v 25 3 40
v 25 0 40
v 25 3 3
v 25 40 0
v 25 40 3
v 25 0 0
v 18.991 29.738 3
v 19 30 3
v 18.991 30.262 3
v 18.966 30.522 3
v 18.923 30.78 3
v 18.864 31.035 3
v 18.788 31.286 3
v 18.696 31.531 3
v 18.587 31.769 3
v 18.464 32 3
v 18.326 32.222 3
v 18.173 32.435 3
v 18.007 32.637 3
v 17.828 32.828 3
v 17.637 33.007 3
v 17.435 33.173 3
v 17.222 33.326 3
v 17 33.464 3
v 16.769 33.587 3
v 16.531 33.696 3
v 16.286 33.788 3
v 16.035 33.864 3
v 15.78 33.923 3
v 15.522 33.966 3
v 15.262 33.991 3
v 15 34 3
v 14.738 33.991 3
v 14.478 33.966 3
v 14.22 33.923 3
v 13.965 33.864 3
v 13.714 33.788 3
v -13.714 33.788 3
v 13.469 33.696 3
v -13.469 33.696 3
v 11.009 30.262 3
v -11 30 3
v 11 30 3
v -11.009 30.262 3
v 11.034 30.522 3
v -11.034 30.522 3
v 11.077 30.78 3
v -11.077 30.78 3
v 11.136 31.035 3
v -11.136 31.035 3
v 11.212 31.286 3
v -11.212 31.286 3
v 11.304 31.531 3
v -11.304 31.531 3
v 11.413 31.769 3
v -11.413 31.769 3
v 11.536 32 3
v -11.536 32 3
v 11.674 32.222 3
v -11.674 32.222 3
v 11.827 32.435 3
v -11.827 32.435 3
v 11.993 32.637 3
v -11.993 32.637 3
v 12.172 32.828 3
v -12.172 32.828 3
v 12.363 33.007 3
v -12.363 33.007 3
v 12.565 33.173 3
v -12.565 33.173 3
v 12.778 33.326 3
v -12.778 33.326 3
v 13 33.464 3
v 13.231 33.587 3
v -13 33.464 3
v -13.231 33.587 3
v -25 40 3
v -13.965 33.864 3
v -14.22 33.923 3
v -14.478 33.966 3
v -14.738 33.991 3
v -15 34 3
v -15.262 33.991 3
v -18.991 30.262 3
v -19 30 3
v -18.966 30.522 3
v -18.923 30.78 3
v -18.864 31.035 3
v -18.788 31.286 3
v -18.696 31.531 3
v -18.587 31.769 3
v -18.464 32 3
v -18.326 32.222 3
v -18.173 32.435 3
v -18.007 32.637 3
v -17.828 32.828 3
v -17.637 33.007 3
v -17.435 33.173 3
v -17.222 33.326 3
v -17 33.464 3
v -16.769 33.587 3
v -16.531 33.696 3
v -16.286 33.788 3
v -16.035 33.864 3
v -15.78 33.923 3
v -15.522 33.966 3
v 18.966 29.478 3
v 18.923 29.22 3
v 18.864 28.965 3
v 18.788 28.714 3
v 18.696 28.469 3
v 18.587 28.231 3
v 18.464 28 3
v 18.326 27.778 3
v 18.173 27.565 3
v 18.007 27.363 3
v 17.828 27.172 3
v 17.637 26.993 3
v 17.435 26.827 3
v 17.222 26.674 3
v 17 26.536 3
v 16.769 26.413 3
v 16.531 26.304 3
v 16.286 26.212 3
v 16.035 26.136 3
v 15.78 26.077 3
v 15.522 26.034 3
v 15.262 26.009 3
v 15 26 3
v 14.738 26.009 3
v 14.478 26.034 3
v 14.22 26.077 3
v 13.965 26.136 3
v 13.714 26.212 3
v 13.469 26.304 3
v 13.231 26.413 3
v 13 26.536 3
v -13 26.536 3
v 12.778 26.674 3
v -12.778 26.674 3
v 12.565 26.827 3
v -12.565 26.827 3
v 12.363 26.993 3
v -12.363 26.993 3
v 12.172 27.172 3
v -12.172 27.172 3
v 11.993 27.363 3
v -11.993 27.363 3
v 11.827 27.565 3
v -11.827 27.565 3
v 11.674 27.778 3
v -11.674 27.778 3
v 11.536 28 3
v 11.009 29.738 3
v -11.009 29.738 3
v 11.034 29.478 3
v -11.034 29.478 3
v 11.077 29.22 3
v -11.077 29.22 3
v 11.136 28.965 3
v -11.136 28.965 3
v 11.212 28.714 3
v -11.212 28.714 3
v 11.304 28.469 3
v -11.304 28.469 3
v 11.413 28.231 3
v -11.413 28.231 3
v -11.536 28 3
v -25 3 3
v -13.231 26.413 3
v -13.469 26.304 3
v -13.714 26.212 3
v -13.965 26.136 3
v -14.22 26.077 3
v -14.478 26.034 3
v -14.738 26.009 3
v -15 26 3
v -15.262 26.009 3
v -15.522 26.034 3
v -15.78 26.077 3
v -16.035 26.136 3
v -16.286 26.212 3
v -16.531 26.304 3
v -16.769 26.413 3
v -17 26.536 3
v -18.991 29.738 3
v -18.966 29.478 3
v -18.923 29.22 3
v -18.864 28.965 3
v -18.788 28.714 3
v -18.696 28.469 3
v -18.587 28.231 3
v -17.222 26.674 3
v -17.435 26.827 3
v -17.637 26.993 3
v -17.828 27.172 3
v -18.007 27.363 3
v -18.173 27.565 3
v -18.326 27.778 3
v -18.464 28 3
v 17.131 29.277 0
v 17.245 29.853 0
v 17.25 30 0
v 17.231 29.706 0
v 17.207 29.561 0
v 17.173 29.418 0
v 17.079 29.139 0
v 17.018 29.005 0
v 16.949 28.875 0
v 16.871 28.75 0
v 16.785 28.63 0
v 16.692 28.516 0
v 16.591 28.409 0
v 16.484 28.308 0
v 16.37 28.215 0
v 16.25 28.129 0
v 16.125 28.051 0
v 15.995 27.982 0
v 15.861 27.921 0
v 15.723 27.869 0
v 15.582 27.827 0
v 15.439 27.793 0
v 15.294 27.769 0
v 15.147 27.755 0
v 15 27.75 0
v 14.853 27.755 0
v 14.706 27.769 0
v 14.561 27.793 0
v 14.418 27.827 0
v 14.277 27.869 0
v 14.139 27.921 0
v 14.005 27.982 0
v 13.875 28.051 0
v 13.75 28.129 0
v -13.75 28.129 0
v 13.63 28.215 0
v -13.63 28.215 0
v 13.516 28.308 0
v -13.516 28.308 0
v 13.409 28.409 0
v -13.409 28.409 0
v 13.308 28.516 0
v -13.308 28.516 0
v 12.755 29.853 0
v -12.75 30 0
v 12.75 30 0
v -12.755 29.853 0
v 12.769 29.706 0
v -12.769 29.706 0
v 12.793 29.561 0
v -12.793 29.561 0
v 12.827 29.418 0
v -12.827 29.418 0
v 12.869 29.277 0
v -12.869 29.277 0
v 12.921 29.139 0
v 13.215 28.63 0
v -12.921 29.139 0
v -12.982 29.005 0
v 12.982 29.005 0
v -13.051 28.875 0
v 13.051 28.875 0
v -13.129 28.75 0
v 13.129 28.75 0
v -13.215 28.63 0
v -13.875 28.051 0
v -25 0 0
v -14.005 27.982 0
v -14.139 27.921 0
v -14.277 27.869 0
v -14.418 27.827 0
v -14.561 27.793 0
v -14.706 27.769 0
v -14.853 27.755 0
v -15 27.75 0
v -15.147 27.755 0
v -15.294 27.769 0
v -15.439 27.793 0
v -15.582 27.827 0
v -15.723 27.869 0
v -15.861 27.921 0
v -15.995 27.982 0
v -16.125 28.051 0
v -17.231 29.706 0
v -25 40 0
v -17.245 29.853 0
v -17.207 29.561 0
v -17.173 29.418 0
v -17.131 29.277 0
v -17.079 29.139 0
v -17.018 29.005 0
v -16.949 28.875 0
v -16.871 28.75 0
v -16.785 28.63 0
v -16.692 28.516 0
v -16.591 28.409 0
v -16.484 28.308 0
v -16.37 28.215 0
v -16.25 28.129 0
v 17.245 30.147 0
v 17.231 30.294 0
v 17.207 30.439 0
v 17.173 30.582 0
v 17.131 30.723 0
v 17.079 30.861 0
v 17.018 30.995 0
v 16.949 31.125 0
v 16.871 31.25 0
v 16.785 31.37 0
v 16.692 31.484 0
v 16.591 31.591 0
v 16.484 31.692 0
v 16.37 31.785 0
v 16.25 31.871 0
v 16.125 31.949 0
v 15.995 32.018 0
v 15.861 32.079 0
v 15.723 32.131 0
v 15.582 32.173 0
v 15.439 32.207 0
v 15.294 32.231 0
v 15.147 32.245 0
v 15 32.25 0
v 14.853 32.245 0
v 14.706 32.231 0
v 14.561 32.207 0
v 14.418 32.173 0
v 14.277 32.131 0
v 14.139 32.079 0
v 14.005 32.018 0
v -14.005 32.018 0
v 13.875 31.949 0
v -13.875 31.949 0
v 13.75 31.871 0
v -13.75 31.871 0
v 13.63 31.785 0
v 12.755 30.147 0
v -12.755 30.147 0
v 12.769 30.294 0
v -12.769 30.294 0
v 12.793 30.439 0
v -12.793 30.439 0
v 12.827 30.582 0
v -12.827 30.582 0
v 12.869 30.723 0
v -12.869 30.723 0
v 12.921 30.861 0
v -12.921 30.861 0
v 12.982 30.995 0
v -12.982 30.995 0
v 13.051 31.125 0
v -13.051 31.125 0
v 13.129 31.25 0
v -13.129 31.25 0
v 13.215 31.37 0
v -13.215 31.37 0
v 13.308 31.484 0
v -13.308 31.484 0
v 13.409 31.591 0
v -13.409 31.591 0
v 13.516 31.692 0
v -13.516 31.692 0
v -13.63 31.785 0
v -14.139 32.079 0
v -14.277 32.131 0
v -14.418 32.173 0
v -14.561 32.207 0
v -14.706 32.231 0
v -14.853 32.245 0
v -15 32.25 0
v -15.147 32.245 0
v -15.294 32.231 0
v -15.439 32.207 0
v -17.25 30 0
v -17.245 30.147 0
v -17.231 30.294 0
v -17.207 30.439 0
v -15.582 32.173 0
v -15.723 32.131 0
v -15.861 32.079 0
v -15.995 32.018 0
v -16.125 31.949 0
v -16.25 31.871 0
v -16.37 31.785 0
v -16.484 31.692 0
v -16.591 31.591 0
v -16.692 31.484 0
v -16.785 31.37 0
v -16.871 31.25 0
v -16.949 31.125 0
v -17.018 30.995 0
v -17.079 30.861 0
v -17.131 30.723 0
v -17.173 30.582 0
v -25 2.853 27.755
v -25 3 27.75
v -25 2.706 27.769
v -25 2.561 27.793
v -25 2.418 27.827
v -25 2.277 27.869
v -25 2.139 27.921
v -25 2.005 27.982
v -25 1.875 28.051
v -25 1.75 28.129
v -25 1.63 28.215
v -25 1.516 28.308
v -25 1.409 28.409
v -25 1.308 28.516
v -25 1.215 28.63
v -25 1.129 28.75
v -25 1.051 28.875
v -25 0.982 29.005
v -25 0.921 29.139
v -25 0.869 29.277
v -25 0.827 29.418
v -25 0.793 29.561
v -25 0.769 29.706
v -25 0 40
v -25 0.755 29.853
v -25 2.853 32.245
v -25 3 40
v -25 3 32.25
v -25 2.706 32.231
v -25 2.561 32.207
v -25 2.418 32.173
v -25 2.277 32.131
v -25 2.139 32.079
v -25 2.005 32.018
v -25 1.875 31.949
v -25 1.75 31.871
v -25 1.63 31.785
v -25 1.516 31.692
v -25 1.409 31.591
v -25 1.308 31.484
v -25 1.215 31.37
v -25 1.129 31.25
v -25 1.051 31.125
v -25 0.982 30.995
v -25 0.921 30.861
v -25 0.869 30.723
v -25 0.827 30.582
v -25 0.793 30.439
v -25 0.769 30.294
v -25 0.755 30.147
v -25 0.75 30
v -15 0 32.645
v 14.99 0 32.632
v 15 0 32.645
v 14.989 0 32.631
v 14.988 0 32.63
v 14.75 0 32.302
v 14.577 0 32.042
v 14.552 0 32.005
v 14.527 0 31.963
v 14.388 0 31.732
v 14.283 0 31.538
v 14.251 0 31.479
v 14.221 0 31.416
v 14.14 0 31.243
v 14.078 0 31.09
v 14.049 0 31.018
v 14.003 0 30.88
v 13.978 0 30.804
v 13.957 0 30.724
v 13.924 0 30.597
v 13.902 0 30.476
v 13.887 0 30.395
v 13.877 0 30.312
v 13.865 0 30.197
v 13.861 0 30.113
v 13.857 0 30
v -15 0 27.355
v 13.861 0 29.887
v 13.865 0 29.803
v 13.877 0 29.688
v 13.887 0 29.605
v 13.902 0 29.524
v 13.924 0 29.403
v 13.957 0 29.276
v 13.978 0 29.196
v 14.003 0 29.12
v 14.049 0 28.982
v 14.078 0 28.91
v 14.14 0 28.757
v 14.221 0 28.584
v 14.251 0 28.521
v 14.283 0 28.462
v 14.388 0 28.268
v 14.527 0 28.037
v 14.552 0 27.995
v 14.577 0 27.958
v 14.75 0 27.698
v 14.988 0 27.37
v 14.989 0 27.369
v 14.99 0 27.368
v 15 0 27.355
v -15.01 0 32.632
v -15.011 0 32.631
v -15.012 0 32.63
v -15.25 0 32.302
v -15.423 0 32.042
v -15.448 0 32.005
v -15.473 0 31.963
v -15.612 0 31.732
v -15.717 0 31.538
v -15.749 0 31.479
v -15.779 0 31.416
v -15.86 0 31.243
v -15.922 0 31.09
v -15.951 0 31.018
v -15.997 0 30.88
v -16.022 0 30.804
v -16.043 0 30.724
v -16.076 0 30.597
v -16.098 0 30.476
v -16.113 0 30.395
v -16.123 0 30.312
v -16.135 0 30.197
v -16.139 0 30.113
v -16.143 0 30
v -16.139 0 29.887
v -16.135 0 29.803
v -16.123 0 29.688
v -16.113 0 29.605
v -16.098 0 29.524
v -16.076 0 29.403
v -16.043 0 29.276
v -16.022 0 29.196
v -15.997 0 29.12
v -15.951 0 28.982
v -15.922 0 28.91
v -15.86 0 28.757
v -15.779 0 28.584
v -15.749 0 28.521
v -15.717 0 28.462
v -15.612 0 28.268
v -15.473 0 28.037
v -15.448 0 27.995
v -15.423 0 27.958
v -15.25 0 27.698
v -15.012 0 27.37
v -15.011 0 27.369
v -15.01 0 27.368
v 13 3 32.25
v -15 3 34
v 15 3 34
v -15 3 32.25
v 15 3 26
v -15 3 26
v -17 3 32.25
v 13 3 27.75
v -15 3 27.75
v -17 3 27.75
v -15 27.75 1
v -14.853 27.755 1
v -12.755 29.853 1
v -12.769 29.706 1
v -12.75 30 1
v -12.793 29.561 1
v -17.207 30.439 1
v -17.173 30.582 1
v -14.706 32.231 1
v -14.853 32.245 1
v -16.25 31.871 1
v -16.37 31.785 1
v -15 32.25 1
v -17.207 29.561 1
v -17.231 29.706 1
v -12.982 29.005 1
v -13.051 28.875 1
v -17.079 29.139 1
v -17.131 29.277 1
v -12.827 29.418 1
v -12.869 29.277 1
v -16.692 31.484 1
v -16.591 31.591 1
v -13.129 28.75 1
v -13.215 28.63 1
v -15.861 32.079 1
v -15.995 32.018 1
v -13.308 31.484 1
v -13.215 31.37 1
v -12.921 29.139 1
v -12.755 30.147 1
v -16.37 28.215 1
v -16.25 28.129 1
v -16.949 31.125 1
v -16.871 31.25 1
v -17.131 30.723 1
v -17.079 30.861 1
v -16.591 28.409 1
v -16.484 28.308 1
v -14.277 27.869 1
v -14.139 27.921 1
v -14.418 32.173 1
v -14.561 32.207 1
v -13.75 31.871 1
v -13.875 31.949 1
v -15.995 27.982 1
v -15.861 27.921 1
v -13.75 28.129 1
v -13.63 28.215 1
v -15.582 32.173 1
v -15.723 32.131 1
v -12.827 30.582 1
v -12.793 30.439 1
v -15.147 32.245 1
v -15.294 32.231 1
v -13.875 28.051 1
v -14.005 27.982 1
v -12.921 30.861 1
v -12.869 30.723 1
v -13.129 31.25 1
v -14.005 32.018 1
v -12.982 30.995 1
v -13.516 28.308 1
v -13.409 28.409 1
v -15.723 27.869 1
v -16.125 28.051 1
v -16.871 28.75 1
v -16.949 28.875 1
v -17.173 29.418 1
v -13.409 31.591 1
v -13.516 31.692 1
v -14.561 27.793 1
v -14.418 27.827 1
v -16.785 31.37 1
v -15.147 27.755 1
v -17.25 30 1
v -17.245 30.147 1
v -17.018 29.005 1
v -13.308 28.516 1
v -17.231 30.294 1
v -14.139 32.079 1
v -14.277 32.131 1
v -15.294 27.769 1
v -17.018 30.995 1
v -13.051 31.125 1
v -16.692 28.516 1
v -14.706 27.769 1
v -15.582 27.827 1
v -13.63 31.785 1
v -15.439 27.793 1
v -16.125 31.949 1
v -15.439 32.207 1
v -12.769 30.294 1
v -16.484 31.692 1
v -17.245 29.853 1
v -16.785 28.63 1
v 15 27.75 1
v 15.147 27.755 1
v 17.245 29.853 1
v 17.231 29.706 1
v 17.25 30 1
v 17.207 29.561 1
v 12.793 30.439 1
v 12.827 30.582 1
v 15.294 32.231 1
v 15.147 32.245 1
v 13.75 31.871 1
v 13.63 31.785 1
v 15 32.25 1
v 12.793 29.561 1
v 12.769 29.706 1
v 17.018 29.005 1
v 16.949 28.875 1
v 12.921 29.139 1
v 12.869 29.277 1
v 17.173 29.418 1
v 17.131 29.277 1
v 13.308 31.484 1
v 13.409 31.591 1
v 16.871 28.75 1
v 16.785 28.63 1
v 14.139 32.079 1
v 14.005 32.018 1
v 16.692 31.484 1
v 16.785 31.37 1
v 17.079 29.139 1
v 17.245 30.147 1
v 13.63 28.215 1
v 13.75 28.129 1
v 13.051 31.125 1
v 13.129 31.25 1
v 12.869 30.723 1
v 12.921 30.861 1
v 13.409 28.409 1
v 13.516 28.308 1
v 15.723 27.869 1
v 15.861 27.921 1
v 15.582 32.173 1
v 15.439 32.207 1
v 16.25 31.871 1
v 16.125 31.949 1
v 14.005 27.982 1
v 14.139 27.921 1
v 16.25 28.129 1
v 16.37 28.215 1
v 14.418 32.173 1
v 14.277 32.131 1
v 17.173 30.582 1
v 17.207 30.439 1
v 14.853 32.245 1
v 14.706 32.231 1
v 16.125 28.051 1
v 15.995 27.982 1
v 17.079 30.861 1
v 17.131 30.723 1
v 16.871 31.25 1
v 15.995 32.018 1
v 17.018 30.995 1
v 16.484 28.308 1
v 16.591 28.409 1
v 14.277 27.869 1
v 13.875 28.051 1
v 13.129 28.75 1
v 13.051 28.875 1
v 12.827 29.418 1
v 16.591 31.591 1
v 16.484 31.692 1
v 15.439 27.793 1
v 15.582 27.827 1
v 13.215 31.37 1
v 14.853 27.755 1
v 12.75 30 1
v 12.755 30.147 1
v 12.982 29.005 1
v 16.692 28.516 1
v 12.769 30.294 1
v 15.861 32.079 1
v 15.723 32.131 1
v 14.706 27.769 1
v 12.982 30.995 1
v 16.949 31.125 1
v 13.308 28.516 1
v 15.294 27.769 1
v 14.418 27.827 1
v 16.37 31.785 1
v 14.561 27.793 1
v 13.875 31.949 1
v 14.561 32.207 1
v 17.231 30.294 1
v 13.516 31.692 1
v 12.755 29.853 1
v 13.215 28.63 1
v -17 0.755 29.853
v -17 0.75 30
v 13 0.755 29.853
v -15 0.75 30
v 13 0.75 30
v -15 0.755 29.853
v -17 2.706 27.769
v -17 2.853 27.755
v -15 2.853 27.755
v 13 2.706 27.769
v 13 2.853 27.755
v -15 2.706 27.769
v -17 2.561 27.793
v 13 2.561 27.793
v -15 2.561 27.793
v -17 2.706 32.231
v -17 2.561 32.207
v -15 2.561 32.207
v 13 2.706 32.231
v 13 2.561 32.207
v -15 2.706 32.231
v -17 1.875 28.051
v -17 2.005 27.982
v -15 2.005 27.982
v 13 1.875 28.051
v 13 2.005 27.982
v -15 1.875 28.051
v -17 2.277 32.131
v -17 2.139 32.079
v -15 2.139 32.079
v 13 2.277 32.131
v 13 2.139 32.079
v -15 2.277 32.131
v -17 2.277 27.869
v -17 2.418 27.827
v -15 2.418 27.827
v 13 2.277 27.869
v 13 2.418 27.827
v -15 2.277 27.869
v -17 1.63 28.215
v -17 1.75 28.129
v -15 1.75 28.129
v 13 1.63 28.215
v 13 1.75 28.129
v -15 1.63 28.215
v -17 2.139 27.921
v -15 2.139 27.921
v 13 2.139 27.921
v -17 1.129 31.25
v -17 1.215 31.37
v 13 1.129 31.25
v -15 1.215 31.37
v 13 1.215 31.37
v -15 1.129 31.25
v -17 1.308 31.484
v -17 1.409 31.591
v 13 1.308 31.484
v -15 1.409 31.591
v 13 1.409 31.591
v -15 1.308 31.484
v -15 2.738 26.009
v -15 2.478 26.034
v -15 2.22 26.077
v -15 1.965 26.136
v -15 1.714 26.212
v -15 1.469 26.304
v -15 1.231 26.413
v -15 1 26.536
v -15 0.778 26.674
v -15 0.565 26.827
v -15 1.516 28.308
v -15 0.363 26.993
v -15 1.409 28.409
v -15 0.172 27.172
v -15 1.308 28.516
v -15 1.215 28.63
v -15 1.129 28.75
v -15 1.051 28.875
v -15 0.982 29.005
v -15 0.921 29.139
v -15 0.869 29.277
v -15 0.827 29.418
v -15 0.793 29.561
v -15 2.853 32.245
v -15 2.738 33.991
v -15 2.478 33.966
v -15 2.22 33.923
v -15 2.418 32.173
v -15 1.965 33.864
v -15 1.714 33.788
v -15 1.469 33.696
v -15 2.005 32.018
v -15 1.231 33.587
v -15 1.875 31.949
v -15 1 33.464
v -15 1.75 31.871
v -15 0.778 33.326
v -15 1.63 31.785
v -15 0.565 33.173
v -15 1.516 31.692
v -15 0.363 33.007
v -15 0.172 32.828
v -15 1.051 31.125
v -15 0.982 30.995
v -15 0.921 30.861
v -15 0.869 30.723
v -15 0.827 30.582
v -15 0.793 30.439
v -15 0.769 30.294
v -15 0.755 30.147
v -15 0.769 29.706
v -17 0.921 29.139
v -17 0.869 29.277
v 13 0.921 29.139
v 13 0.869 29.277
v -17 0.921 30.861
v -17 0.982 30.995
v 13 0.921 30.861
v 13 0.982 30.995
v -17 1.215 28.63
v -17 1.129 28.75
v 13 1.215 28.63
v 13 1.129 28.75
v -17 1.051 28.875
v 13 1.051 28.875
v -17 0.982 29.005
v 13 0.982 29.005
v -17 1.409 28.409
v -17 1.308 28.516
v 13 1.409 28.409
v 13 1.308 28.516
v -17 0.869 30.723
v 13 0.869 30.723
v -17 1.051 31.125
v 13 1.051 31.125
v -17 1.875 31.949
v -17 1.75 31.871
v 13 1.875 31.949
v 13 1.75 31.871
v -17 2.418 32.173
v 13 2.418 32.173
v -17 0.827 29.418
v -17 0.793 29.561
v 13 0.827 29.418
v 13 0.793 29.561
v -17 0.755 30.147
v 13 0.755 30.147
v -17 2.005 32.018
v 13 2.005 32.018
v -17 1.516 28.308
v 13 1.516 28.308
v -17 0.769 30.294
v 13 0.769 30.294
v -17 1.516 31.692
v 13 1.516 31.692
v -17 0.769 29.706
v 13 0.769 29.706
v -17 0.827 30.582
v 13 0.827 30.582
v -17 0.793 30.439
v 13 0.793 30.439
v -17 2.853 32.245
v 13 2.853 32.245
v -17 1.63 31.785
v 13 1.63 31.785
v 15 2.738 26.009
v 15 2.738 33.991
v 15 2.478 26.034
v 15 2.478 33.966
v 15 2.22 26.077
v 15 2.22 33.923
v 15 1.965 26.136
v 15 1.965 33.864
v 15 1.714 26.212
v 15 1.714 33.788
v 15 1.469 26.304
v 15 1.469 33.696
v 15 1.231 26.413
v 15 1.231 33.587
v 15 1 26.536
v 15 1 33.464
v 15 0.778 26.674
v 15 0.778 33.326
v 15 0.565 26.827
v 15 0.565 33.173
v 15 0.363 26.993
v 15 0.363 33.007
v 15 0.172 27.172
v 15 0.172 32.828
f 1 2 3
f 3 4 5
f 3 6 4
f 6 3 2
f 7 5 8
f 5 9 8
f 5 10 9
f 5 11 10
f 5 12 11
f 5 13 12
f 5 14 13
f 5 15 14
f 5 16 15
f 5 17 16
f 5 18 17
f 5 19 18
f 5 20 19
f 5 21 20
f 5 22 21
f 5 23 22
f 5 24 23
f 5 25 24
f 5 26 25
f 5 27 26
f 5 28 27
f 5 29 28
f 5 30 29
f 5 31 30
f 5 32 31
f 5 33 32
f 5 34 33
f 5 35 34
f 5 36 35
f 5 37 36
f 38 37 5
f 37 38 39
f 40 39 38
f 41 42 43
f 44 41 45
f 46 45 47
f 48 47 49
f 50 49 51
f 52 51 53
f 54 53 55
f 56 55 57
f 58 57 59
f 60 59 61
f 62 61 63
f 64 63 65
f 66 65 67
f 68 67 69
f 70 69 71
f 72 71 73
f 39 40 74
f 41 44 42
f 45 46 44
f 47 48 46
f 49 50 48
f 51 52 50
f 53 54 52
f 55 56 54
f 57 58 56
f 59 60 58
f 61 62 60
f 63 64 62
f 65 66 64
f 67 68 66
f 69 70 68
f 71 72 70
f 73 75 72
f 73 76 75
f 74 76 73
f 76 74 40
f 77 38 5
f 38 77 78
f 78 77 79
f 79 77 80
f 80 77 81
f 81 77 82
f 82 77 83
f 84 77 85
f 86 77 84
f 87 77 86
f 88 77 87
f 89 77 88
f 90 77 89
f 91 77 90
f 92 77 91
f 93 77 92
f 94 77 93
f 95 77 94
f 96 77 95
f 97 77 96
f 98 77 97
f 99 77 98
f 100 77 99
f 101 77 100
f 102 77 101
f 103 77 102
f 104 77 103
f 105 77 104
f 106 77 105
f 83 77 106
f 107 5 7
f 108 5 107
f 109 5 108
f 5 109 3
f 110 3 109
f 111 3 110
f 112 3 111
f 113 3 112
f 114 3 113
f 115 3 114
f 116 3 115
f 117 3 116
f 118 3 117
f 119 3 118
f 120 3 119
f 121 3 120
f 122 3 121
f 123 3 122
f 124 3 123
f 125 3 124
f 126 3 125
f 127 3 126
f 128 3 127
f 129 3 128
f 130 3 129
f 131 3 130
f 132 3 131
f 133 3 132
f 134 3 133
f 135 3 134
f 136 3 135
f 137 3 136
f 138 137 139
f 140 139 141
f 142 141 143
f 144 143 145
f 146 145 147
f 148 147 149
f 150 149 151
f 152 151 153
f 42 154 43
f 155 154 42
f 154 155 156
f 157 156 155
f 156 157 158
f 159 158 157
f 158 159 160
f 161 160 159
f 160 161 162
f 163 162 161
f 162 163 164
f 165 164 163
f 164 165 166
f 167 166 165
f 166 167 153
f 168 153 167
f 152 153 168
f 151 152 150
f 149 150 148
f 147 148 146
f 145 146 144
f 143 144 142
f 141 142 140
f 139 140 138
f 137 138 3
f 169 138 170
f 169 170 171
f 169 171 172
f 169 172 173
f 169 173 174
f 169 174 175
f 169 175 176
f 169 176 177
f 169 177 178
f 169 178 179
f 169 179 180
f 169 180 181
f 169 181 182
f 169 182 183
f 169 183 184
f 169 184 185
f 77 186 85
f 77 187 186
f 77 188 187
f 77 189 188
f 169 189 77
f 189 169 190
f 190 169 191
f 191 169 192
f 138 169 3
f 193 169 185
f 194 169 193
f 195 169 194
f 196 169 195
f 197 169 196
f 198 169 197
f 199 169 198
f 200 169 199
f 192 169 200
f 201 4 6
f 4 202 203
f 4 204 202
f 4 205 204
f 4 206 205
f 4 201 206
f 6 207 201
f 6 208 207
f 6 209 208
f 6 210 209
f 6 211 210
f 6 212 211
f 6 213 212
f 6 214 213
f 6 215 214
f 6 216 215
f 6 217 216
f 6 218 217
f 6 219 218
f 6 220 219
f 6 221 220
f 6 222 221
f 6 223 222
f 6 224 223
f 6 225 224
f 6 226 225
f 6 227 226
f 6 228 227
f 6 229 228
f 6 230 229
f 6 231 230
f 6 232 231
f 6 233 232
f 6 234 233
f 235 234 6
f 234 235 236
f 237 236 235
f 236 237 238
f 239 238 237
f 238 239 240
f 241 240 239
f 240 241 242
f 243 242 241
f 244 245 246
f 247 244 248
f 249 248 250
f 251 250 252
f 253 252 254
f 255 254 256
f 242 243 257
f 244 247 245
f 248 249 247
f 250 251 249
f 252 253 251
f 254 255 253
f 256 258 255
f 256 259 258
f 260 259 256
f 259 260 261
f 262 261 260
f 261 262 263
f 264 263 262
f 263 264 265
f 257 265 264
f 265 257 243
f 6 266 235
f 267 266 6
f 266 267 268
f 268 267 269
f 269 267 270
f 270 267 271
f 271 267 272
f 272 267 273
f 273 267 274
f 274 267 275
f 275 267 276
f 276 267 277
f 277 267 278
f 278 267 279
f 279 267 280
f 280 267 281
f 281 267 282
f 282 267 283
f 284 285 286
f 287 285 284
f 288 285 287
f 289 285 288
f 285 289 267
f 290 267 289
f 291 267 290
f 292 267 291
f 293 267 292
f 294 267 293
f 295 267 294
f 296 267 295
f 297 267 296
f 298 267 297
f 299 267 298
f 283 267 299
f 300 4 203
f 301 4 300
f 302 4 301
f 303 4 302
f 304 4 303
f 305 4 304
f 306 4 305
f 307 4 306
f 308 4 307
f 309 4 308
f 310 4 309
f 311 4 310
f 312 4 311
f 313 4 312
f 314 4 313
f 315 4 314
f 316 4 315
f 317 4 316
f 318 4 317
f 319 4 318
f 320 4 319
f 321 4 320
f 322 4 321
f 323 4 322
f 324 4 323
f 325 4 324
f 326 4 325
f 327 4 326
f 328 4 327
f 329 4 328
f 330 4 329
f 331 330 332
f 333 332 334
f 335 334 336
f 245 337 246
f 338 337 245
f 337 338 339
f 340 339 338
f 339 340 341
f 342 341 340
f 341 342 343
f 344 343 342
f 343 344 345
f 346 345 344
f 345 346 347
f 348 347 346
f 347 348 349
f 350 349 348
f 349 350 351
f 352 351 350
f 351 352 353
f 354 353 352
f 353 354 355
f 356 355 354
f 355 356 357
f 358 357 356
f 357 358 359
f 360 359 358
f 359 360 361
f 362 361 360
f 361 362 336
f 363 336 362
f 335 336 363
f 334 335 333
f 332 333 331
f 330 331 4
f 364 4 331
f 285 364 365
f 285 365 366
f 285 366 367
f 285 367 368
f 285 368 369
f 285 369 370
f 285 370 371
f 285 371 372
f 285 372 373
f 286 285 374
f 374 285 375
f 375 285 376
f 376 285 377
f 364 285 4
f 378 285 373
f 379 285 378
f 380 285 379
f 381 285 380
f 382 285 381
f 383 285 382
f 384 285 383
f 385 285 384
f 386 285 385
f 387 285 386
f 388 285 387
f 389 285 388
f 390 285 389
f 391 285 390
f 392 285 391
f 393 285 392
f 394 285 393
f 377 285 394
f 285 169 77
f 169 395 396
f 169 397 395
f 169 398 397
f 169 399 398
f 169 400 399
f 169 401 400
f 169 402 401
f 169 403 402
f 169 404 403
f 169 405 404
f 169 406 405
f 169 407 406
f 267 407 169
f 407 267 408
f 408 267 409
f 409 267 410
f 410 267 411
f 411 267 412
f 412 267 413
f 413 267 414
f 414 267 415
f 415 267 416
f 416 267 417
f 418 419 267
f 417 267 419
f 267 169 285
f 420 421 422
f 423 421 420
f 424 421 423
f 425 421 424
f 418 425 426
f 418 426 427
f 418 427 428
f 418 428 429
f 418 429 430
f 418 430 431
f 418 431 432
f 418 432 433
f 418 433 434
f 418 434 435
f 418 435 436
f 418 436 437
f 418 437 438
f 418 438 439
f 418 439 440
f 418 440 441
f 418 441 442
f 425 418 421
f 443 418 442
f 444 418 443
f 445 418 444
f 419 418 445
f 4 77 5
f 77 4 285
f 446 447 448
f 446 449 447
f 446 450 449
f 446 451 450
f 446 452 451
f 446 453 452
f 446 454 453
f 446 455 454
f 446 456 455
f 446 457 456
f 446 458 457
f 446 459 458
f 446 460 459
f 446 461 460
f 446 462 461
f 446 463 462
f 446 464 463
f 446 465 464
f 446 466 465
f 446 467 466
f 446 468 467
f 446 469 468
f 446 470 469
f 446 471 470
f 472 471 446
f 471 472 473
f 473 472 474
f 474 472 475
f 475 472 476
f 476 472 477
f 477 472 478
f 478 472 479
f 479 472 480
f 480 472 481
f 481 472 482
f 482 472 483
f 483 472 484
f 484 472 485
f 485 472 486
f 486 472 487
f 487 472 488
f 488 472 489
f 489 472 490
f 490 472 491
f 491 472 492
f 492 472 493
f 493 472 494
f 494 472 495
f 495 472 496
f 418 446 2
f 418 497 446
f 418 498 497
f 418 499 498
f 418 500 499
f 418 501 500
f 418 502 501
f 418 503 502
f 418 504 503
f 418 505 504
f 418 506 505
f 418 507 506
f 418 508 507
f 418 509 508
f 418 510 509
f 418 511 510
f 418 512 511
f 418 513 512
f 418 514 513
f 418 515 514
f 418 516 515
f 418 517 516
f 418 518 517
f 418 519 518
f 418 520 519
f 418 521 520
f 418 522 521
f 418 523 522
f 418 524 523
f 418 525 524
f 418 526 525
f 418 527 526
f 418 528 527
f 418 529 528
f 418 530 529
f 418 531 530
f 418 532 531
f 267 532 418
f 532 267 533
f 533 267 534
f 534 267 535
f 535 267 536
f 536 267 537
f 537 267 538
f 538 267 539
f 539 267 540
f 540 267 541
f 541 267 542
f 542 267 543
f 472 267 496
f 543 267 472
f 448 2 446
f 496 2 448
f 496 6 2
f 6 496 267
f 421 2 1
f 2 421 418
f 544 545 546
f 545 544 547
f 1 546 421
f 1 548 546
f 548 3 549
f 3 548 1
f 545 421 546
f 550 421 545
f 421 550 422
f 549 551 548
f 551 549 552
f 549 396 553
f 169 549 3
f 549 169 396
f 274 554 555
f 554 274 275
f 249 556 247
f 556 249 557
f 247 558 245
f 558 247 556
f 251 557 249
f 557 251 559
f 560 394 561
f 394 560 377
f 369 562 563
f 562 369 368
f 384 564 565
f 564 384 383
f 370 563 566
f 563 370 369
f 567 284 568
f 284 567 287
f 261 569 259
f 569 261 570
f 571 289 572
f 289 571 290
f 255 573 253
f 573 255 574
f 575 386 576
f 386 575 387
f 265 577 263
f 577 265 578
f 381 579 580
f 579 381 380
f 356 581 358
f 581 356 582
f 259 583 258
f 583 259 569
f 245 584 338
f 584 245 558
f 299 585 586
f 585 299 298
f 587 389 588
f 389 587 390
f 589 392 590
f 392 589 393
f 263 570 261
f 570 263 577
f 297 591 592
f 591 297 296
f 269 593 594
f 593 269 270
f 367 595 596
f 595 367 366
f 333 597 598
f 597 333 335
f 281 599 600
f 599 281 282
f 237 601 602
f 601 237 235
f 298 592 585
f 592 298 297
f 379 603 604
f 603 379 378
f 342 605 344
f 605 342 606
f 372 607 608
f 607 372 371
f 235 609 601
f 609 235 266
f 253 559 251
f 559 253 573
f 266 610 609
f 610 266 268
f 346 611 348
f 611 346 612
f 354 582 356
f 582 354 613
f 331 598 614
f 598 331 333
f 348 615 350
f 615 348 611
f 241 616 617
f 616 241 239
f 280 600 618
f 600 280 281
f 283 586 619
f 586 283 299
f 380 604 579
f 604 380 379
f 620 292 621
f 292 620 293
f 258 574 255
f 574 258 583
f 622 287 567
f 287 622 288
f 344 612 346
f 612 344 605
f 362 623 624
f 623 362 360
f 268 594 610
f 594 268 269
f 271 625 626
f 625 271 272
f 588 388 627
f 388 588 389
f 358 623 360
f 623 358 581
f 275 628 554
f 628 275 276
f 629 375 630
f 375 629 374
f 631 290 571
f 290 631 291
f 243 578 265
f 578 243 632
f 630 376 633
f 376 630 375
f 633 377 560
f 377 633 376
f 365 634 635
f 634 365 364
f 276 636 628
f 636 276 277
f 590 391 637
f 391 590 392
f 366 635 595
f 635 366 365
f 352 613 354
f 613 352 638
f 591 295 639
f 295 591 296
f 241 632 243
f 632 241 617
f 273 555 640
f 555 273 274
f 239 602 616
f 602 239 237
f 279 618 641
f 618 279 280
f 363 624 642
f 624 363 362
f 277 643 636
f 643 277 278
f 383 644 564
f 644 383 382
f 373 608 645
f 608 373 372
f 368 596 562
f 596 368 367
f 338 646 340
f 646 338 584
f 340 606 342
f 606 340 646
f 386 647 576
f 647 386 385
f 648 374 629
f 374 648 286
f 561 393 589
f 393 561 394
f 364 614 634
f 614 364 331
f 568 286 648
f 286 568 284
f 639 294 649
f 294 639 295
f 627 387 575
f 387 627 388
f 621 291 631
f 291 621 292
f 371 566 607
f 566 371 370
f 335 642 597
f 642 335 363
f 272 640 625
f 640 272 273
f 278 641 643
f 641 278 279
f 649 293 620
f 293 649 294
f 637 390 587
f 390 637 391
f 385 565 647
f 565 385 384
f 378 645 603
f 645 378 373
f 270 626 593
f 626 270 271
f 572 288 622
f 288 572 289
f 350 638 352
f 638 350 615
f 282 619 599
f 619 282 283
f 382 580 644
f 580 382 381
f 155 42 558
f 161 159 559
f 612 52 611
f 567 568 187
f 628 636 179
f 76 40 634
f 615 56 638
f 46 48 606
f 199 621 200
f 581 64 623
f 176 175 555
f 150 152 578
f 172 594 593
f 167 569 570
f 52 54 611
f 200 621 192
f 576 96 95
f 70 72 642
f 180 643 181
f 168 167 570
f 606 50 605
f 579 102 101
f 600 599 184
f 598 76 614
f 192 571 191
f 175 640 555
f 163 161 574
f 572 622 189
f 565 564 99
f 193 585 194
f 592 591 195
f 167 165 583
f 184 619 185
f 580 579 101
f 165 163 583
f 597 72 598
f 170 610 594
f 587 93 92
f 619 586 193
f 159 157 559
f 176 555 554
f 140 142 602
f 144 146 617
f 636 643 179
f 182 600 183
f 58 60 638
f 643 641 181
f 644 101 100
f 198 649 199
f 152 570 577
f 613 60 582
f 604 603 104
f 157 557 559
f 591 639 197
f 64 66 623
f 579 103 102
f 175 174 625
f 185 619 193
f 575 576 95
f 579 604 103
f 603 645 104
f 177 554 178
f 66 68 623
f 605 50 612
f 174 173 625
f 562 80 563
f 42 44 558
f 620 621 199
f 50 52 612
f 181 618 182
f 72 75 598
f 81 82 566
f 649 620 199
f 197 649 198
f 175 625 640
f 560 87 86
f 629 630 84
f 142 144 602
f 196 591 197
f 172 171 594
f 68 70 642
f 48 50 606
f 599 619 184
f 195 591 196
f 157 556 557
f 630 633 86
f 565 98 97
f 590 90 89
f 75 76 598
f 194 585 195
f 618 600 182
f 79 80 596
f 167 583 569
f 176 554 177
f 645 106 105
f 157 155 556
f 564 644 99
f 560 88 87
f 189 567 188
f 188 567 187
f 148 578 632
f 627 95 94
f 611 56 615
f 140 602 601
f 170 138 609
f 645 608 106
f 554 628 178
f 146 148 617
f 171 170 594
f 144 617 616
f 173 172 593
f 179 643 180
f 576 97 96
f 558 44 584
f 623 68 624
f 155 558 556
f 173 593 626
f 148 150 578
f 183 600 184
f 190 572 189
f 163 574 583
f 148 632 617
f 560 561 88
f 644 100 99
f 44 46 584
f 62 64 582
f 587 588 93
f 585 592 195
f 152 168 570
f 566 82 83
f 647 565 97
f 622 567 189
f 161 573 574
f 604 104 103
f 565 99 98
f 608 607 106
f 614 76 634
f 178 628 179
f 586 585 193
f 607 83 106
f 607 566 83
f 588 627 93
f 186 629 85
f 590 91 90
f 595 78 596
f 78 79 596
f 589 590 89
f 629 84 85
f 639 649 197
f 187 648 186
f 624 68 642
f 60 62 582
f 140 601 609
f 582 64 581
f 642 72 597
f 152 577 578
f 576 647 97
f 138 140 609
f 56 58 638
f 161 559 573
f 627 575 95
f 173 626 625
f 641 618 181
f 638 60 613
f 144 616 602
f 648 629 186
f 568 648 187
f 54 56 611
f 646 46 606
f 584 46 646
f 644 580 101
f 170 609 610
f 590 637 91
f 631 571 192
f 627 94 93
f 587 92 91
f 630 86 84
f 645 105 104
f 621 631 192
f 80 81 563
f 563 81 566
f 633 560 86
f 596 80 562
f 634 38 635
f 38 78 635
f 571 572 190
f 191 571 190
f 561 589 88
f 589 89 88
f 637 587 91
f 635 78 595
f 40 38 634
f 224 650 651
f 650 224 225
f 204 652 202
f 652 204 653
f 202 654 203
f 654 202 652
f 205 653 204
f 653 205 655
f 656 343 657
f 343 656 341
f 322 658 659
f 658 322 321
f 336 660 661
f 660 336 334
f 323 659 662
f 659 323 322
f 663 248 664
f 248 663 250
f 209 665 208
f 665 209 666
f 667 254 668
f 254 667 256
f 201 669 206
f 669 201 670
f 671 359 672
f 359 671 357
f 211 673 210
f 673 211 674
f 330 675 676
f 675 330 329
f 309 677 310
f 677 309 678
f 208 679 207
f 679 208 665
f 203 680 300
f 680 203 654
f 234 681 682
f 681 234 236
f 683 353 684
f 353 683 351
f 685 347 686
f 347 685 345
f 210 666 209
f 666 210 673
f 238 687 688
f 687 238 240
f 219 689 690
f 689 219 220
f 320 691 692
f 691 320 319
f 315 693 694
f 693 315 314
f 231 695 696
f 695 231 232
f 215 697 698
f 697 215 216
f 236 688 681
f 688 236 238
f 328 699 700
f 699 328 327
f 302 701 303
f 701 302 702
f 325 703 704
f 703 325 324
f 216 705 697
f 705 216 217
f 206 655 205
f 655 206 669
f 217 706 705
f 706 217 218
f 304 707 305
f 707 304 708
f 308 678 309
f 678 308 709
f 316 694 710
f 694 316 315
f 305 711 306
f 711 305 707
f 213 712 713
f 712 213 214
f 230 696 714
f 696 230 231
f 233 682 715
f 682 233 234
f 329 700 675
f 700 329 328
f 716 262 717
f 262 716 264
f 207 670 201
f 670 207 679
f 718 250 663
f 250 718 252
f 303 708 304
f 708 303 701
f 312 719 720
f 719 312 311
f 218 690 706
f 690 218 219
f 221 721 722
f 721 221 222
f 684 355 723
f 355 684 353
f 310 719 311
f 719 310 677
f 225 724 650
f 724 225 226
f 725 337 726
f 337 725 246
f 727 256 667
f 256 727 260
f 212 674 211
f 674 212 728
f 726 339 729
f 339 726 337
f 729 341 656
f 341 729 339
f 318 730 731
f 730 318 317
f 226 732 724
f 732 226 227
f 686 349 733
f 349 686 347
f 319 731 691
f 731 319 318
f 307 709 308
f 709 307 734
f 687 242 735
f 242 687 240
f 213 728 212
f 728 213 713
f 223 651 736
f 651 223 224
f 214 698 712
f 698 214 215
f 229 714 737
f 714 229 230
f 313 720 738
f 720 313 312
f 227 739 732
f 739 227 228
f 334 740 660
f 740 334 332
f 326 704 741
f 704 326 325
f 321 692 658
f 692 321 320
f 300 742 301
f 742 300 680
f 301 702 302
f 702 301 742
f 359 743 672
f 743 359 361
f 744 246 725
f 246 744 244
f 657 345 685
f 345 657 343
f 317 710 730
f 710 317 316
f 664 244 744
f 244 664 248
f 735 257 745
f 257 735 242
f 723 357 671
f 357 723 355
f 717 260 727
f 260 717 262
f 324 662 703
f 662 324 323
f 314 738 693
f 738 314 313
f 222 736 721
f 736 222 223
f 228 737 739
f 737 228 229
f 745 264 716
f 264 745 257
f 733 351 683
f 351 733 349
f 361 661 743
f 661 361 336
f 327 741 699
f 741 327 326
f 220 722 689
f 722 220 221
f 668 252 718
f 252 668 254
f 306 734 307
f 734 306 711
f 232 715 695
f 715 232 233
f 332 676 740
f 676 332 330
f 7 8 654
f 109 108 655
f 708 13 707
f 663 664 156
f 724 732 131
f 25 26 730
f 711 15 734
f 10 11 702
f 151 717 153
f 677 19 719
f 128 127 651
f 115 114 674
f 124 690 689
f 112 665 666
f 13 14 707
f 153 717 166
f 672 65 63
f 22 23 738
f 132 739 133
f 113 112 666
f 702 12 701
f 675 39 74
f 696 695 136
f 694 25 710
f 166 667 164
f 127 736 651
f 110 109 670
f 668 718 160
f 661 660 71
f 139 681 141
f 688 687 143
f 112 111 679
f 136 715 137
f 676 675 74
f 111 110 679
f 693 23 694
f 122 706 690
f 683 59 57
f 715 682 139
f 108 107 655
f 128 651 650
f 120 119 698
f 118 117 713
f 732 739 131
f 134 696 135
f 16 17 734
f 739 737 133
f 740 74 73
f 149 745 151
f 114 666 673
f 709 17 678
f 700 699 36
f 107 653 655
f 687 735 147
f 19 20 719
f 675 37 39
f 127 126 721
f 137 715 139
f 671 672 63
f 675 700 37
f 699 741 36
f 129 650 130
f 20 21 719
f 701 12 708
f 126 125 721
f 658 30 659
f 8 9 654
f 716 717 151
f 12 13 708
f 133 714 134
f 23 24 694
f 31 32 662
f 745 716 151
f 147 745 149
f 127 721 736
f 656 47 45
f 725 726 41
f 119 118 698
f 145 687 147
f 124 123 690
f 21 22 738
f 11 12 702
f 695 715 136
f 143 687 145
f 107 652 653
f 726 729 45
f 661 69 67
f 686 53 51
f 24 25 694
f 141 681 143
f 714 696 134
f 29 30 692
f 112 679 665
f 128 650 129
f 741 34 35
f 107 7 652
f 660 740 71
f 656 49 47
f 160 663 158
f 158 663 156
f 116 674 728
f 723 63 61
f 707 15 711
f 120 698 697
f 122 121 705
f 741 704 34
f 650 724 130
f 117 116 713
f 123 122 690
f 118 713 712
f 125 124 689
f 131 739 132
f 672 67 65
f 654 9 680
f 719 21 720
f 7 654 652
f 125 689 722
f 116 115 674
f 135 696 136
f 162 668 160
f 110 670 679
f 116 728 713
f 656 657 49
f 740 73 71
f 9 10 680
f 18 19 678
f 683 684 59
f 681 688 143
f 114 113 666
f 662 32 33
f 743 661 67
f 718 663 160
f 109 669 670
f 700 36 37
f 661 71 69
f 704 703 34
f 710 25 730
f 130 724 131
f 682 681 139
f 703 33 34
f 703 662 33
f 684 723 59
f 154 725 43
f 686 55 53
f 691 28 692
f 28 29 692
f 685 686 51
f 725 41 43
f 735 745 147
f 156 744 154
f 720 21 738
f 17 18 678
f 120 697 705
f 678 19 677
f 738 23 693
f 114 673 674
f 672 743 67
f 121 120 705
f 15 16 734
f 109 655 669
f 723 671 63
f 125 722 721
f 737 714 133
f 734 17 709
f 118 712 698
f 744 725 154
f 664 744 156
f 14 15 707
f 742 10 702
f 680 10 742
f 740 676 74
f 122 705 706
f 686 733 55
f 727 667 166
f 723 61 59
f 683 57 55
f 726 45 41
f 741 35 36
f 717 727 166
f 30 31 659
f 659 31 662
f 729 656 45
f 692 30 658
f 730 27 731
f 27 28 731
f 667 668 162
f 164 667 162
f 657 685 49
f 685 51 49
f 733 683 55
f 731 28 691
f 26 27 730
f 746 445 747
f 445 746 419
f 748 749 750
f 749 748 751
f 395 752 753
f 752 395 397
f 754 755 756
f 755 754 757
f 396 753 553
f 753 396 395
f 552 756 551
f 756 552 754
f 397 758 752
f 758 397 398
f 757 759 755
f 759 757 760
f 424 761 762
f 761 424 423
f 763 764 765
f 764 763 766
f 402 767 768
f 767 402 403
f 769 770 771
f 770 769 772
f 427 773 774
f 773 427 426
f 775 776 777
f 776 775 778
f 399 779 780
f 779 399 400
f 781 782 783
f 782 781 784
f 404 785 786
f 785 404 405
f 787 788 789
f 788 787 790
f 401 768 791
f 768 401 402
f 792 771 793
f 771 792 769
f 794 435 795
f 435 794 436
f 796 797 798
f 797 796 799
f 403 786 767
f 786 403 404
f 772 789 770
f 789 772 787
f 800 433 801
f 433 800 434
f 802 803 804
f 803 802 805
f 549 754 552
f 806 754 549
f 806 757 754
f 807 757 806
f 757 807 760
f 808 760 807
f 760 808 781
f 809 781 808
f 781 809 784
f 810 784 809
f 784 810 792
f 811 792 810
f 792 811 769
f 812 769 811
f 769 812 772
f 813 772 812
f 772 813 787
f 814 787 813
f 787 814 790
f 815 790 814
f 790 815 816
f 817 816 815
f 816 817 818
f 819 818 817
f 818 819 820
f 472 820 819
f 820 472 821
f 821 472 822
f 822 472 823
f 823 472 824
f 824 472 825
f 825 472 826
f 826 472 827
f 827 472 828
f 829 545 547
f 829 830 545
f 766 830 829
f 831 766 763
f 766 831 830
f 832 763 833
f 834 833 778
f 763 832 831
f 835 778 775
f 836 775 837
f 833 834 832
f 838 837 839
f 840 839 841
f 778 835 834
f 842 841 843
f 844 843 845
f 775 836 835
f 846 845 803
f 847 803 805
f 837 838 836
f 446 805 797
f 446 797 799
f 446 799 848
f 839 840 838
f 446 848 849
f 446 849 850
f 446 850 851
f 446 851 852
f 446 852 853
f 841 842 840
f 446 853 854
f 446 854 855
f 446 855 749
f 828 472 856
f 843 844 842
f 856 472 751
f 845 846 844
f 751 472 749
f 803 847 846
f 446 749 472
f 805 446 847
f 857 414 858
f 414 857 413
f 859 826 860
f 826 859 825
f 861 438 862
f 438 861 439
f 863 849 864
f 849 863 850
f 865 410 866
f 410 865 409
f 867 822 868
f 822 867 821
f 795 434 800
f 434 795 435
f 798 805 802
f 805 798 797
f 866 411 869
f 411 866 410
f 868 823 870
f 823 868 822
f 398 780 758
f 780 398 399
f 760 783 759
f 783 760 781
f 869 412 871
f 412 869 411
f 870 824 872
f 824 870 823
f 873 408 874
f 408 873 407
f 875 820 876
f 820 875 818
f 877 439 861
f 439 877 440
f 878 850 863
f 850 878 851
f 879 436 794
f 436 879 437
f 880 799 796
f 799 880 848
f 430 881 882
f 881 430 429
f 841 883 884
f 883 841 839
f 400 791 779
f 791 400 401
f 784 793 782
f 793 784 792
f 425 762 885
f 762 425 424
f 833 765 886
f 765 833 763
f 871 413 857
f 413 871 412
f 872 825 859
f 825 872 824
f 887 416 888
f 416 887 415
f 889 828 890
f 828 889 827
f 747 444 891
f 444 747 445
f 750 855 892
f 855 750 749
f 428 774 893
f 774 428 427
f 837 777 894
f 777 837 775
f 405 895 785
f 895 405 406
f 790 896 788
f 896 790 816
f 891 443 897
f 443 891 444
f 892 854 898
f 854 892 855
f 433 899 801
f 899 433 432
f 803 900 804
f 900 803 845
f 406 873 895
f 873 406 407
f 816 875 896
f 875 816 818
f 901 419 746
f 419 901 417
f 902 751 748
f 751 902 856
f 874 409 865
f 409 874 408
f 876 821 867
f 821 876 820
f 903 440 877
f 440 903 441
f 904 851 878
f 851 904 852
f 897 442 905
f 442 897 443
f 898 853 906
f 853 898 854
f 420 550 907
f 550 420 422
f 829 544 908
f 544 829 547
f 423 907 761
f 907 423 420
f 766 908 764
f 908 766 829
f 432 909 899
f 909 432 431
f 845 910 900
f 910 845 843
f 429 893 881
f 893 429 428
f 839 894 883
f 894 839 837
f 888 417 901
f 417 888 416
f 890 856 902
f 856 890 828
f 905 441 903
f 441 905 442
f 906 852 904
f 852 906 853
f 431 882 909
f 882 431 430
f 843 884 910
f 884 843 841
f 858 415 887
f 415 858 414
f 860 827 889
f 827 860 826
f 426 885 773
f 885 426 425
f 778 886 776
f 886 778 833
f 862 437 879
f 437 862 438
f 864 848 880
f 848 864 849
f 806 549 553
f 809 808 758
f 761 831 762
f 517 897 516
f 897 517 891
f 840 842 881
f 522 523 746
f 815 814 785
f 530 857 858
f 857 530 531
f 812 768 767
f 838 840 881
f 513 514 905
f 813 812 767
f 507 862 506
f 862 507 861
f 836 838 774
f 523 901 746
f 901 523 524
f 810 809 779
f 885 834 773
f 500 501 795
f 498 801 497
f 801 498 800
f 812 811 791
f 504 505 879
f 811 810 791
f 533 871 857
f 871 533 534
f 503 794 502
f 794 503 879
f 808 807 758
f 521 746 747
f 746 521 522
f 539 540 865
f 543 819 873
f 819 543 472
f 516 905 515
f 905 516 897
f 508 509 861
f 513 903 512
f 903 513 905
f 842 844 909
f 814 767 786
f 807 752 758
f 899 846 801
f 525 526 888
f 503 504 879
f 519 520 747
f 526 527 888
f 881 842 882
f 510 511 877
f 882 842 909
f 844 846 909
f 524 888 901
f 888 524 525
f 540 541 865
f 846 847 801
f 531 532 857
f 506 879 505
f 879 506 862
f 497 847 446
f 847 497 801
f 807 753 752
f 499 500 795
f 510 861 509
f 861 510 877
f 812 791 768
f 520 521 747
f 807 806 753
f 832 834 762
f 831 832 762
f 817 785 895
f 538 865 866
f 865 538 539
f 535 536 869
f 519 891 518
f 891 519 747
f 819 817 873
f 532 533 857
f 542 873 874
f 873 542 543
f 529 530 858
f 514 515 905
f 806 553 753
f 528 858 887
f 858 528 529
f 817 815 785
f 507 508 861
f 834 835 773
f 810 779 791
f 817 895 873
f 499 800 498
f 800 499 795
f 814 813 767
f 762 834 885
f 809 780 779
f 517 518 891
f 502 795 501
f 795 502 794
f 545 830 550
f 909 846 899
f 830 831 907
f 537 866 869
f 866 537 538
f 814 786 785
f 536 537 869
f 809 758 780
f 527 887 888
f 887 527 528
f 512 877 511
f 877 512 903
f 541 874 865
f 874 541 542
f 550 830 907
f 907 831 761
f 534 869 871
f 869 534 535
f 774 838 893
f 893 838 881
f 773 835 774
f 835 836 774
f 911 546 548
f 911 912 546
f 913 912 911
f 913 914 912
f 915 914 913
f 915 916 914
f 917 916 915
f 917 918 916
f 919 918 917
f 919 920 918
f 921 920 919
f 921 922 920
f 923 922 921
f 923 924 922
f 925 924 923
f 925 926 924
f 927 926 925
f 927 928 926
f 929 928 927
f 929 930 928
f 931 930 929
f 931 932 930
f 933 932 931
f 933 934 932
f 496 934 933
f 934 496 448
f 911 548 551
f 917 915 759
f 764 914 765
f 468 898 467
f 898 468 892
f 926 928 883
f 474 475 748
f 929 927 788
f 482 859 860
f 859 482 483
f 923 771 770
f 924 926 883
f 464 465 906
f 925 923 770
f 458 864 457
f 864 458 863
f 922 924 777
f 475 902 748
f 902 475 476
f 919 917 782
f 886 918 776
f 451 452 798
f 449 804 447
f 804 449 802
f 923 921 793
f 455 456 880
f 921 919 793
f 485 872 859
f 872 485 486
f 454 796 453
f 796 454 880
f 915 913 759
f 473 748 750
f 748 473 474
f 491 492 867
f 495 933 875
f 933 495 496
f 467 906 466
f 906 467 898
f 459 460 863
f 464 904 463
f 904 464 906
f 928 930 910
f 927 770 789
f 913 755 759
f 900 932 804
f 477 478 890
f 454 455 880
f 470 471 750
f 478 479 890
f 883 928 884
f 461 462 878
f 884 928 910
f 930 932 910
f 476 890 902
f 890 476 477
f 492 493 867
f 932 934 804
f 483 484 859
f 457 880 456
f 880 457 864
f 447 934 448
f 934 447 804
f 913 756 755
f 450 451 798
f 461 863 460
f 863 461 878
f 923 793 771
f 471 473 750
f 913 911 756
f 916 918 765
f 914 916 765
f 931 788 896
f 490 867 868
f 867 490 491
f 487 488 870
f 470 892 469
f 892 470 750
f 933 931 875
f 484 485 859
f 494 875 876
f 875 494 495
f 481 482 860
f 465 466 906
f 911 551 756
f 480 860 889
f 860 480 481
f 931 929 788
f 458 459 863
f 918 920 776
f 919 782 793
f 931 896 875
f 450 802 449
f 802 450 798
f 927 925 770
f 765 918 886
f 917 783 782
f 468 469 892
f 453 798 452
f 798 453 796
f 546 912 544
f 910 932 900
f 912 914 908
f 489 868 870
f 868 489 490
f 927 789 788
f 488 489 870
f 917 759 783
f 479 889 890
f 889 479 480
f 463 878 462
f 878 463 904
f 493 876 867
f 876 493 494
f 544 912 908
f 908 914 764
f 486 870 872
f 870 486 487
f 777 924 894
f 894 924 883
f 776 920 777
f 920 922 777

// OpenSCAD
// L-bracket with 4x M4 countersunk holes (2 per flange)
// Inner corner at origin: horizontal flange extends +Y, vertical flange extends +Z

$fn = 96;

module countersunk_hole(shaft_d=4.5, head_d=8, head_h=2, through=50){
    // Countersink + through: axis along +Z (top at z=0, extends to -)
    // Note: We start hole at z=0 and cut downward so it cleanly matches the faces.
    union() {
        // through
        cylinder(h=through, d=shaft_d, center=false);

        // countersink (cone)
        translate([0,0,0])
            cylinder(h=head_h, d1=head_d, d2=shaft_d, center=false);
    }
}

module l_bracket() {
    w = 50;   // width (X)
    d = 40;   // length of flange along Y (horizontal) / Z (vertical)
    t = 3;    // thickness of both flanges

    // hole x positions: on center line in X, 10mm inside from outer edge -> x = ±(w/2-10)
    hx = [-(w/2 - 10), (w/2 - 10)];

    // hole y/z positions: 10mm inside from outer edge
    hy = d - 10; // for horizontal flange: y in [0..d], outer edge at y=d
    hz = d - 10; // for vertical flange: z in [0..d], outer edge at z=d

    difference() {
        union() {
            // Horizontal flange: X=[-w/2..+w/2], Y=[0..d], Z=[0..t]
            translate([-w/2, 0, 0])
                cube([w, d, t]);

            // Vertical flange: X=[-w/2..+w/2], Y=[0..t], Z=[0..d]
            translate([-w/2, 0, 0])
                cube([w, t, d]);
        }

        // --- Horizontal flange holes (2x) ---
        // Countersink should face outer side: +Z (top face at z=t)
        for (x = hx) {
            // Place so that countersink seat is cut from the top face (z=t) downwards
            translate([x, hy, t])
                rotate([180,0,0]) // flip so the countersink points upward (+Z face) in original model coordinates
                    countersunk_hole(shaft_d=4.5, head_d=8, head_h=2, through=100);
        }

        // --- Vertical flange holes (2x) ---
        // Countersink should face outer side: +Y (away from inner corner)
        // Vertical flange thickness is along Y: Y in [0..t], outer face at Y=t
        for (x = hx) {
            // Place at outer face (y=t) and cut toward -Y
            translate([x, t, hz])
                rotate([0,90,0])   // rotate Z-axis hole to Y-axis
                    // flip to ensure countersink opens toward +Y (outer face)
                    rotate([180,0,0])
                        countersunk_hole(shaft_d=4.5, head_d=8, head_h=2, through=100);
        }
    }
}

l_bracket();
